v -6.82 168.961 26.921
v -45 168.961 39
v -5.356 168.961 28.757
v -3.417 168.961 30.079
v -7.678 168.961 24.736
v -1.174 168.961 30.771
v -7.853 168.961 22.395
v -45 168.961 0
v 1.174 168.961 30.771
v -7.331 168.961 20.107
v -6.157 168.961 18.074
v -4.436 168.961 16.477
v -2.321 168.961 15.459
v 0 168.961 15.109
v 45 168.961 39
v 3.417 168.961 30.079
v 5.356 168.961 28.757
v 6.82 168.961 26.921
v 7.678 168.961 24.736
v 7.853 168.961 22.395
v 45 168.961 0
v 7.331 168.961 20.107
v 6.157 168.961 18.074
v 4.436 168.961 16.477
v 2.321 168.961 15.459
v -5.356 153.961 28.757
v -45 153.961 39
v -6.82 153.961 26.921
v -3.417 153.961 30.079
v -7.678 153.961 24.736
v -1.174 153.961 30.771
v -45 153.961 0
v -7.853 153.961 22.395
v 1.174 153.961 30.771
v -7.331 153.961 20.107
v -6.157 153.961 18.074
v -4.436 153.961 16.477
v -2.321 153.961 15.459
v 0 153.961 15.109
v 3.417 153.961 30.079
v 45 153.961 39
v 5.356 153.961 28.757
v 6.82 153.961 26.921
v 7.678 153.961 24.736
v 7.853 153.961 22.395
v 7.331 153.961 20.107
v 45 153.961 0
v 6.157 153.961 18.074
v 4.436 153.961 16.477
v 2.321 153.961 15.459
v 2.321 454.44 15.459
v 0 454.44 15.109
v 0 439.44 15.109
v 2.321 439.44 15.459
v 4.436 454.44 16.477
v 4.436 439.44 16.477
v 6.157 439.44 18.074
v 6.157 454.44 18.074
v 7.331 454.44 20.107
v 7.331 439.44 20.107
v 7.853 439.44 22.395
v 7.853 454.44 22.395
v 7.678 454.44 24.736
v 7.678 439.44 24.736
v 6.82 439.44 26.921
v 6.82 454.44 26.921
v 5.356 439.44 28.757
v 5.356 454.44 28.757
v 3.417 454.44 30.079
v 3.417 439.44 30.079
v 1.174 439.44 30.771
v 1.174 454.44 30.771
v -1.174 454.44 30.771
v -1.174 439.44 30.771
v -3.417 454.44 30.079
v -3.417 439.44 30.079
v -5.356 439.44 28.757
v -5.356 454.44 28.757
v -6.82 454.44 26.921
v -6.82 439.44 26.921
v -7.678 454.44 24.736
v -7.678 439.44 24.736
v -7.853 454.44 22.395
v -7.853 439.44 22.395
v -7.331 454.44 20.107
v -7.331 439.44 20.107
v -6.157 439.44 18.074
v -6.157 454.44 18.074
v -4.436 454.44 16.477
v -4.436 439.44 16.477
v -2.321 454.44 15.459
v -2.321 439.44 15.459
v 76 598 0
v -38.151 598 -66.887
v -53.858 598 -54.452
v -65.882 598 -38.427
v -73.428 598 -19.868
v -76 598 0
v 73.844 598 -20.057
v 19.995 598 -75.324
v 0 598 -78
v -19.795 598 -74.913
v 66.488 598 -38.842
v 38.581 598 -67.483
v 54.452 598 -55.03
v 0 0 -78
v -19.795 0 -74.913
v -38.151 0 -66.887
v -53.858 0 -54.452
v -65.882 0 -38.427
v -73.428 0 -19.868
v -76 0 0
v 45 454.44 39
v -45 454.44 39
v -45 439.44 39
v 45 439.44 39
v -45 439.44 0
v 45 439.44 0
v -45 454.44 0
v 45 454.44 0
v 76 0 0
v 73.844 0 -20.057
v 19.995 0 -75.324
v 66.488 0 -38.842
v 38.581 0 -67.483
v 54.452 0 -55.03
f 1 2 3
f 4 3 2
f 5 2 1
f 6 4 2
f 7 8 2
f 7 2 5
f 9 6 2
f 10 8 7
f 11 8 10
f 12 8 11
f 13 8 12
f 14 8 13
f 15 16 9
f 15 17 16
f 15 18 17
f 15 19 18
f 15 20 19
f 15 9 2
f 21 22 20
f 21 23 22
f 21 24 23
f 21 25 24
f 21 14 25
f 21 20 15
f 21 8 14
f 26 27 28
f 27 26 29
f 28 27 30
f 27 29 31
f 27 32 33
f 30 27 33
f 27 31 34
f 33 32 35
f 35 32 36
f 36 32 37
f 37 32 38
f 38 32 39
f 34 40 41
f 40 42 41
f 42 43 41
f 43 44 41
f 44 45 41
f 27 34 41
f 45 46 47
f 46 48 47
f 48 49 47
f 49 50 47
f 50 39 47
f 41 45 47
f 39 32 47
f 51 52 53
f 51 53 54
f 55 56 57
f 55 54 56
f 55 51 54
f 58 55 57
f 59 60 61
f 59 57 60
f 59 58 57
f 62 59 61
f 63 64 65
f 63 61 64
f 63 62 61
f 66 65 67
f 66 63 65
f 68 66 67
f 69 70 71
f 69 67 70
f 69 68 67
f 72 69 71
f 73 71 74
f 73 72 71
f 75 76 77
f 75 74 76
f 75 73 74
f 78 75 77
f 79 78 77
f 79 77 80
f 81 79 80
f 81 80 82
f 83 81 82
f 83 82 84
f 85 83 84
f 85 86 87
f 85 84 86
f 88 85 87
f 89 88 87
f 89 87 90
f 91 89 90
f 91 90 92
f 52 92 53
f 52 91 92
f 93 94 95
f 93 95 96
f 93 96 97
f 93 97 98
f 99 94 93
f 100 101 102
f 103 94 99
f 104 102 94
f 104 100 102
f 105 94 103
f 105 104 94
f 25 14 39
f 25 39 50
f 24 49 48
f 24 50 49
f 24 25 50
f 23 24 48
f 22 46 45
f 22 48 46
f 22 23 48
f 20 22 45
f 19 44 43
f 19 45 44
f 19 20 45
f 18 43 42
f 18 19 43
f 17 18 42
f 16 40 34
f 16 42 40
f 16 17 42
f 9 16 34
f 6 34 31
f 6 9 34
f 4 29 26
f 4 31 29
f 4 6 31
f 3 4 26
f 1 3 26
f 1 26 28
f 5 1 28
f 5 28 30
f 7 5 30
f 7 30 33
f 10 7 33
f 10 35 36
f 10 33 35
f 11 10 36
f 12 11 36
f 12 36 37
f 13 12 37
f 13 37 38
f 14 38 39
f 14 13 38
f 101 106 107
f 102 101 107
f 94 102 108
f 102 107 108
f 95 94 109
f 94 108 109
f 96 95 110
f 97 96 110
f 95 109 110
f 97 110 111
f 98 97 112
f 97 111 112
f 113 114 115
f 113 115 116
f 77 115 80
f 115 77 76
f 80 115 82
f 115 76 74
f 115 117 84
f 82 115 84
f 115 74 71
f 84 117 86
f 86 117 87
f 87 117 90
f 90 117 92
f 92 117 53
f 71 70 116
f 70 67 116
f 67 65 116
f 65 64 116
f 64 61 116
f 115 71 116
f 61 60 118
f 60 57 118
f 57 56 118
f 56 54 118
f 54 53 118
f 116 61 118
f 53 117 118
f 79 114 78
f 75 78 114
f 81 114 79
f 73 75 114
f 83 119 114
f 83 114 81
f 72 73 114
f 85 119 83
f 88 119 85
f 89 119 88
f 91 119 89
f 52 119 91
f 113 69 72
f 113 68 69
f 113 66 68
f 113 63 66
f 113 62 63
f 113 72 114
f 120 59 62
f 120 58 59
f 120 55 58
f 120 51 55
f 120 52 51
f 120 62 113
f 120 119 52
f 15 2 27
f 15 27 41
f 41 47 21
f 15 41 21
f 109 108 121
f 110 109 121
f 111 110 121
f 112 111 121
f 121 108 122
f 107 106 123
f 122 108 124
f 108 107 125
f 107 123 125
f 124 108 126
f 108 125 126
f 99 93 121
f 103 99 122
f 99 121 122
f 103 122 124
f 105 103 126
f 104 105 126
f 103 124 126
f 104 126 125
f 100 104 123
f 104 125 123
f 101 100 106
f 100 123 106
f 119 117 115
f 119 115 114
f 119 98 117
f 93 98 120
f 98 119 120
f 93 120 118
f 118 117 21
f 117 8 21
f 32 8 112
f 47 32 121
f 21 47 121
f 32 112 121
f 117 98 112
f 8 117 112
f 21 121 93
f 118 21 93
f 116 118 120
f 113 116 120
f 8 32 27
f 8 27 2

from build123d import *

# Parameters (mm, degrees)
BOSS_EXTRUDE1_DEPTH     = 598
SKETCH2_W               = 90
SKETCH2_H               = 15
BOSS_EXTRUDE2_DEPTH     = 39
CUT_EXTRUDE1_DEPTH      = 458.203414552
CUT_EXTRUDE1_DEPTH_BACK = 458.203414552
SKETCH3_R               = 7.875


with BuildPart() as part:
    # Sketch1 → Boss-Extrude1 (new body)
    with BuildSketch(Plane(origin=(0, 0, 0), x_dir=(1, 0, 0), z_dir=(0, 1, 0))):
        with BuildLine():
            Line((-76, 0), (76, 0))
            ThreePointArc((76, 0), (54.45181356, 55.029972187), (0, 78))
            ThreePointArc((0, 78), (-53.858440233, 54.45181356), (-76, 0))
        make_face()
    extrude(amount=BOSS_EXTRUDE1_DEPTH)

    # Sketch2 → Boss-Extrude2 (add)
    with BuildSketch(Plane.XY):
        with Locations((0, 446.94016831)):
            Rectangle(SKETCH2_W, SKETCH2_H)
        with Locations((0, 161.460515061)):
            Rectangle(SKETCH2_W, SKETCH2_H)
    extrude(amount=BOSS_EXTRUDE2_DEPTH)

    # Sketch3 → Cut-Extrude1 (cut, two sides: drawn at the far end of the back side and taken through both)
    with BuildSketch(Plane(origin=(0, 153.960515061, 0), x_dir=(-1, 0, 0), z_dir=(0, -1, 0)).offset(-CUT_EXTRUDE1_DEPTH_BACK)):
        with Locations(Location((0, -22.983942377, 0), (0, 0, 90))):
            Circle(SKETCH3_R)
    extrude(amount=CUT_EXTRUDE1_DEPTH + CUT_EXTRUDE1_DEPTH_BACK, mode=Mode.SUBTRACT)


solid = part.part
